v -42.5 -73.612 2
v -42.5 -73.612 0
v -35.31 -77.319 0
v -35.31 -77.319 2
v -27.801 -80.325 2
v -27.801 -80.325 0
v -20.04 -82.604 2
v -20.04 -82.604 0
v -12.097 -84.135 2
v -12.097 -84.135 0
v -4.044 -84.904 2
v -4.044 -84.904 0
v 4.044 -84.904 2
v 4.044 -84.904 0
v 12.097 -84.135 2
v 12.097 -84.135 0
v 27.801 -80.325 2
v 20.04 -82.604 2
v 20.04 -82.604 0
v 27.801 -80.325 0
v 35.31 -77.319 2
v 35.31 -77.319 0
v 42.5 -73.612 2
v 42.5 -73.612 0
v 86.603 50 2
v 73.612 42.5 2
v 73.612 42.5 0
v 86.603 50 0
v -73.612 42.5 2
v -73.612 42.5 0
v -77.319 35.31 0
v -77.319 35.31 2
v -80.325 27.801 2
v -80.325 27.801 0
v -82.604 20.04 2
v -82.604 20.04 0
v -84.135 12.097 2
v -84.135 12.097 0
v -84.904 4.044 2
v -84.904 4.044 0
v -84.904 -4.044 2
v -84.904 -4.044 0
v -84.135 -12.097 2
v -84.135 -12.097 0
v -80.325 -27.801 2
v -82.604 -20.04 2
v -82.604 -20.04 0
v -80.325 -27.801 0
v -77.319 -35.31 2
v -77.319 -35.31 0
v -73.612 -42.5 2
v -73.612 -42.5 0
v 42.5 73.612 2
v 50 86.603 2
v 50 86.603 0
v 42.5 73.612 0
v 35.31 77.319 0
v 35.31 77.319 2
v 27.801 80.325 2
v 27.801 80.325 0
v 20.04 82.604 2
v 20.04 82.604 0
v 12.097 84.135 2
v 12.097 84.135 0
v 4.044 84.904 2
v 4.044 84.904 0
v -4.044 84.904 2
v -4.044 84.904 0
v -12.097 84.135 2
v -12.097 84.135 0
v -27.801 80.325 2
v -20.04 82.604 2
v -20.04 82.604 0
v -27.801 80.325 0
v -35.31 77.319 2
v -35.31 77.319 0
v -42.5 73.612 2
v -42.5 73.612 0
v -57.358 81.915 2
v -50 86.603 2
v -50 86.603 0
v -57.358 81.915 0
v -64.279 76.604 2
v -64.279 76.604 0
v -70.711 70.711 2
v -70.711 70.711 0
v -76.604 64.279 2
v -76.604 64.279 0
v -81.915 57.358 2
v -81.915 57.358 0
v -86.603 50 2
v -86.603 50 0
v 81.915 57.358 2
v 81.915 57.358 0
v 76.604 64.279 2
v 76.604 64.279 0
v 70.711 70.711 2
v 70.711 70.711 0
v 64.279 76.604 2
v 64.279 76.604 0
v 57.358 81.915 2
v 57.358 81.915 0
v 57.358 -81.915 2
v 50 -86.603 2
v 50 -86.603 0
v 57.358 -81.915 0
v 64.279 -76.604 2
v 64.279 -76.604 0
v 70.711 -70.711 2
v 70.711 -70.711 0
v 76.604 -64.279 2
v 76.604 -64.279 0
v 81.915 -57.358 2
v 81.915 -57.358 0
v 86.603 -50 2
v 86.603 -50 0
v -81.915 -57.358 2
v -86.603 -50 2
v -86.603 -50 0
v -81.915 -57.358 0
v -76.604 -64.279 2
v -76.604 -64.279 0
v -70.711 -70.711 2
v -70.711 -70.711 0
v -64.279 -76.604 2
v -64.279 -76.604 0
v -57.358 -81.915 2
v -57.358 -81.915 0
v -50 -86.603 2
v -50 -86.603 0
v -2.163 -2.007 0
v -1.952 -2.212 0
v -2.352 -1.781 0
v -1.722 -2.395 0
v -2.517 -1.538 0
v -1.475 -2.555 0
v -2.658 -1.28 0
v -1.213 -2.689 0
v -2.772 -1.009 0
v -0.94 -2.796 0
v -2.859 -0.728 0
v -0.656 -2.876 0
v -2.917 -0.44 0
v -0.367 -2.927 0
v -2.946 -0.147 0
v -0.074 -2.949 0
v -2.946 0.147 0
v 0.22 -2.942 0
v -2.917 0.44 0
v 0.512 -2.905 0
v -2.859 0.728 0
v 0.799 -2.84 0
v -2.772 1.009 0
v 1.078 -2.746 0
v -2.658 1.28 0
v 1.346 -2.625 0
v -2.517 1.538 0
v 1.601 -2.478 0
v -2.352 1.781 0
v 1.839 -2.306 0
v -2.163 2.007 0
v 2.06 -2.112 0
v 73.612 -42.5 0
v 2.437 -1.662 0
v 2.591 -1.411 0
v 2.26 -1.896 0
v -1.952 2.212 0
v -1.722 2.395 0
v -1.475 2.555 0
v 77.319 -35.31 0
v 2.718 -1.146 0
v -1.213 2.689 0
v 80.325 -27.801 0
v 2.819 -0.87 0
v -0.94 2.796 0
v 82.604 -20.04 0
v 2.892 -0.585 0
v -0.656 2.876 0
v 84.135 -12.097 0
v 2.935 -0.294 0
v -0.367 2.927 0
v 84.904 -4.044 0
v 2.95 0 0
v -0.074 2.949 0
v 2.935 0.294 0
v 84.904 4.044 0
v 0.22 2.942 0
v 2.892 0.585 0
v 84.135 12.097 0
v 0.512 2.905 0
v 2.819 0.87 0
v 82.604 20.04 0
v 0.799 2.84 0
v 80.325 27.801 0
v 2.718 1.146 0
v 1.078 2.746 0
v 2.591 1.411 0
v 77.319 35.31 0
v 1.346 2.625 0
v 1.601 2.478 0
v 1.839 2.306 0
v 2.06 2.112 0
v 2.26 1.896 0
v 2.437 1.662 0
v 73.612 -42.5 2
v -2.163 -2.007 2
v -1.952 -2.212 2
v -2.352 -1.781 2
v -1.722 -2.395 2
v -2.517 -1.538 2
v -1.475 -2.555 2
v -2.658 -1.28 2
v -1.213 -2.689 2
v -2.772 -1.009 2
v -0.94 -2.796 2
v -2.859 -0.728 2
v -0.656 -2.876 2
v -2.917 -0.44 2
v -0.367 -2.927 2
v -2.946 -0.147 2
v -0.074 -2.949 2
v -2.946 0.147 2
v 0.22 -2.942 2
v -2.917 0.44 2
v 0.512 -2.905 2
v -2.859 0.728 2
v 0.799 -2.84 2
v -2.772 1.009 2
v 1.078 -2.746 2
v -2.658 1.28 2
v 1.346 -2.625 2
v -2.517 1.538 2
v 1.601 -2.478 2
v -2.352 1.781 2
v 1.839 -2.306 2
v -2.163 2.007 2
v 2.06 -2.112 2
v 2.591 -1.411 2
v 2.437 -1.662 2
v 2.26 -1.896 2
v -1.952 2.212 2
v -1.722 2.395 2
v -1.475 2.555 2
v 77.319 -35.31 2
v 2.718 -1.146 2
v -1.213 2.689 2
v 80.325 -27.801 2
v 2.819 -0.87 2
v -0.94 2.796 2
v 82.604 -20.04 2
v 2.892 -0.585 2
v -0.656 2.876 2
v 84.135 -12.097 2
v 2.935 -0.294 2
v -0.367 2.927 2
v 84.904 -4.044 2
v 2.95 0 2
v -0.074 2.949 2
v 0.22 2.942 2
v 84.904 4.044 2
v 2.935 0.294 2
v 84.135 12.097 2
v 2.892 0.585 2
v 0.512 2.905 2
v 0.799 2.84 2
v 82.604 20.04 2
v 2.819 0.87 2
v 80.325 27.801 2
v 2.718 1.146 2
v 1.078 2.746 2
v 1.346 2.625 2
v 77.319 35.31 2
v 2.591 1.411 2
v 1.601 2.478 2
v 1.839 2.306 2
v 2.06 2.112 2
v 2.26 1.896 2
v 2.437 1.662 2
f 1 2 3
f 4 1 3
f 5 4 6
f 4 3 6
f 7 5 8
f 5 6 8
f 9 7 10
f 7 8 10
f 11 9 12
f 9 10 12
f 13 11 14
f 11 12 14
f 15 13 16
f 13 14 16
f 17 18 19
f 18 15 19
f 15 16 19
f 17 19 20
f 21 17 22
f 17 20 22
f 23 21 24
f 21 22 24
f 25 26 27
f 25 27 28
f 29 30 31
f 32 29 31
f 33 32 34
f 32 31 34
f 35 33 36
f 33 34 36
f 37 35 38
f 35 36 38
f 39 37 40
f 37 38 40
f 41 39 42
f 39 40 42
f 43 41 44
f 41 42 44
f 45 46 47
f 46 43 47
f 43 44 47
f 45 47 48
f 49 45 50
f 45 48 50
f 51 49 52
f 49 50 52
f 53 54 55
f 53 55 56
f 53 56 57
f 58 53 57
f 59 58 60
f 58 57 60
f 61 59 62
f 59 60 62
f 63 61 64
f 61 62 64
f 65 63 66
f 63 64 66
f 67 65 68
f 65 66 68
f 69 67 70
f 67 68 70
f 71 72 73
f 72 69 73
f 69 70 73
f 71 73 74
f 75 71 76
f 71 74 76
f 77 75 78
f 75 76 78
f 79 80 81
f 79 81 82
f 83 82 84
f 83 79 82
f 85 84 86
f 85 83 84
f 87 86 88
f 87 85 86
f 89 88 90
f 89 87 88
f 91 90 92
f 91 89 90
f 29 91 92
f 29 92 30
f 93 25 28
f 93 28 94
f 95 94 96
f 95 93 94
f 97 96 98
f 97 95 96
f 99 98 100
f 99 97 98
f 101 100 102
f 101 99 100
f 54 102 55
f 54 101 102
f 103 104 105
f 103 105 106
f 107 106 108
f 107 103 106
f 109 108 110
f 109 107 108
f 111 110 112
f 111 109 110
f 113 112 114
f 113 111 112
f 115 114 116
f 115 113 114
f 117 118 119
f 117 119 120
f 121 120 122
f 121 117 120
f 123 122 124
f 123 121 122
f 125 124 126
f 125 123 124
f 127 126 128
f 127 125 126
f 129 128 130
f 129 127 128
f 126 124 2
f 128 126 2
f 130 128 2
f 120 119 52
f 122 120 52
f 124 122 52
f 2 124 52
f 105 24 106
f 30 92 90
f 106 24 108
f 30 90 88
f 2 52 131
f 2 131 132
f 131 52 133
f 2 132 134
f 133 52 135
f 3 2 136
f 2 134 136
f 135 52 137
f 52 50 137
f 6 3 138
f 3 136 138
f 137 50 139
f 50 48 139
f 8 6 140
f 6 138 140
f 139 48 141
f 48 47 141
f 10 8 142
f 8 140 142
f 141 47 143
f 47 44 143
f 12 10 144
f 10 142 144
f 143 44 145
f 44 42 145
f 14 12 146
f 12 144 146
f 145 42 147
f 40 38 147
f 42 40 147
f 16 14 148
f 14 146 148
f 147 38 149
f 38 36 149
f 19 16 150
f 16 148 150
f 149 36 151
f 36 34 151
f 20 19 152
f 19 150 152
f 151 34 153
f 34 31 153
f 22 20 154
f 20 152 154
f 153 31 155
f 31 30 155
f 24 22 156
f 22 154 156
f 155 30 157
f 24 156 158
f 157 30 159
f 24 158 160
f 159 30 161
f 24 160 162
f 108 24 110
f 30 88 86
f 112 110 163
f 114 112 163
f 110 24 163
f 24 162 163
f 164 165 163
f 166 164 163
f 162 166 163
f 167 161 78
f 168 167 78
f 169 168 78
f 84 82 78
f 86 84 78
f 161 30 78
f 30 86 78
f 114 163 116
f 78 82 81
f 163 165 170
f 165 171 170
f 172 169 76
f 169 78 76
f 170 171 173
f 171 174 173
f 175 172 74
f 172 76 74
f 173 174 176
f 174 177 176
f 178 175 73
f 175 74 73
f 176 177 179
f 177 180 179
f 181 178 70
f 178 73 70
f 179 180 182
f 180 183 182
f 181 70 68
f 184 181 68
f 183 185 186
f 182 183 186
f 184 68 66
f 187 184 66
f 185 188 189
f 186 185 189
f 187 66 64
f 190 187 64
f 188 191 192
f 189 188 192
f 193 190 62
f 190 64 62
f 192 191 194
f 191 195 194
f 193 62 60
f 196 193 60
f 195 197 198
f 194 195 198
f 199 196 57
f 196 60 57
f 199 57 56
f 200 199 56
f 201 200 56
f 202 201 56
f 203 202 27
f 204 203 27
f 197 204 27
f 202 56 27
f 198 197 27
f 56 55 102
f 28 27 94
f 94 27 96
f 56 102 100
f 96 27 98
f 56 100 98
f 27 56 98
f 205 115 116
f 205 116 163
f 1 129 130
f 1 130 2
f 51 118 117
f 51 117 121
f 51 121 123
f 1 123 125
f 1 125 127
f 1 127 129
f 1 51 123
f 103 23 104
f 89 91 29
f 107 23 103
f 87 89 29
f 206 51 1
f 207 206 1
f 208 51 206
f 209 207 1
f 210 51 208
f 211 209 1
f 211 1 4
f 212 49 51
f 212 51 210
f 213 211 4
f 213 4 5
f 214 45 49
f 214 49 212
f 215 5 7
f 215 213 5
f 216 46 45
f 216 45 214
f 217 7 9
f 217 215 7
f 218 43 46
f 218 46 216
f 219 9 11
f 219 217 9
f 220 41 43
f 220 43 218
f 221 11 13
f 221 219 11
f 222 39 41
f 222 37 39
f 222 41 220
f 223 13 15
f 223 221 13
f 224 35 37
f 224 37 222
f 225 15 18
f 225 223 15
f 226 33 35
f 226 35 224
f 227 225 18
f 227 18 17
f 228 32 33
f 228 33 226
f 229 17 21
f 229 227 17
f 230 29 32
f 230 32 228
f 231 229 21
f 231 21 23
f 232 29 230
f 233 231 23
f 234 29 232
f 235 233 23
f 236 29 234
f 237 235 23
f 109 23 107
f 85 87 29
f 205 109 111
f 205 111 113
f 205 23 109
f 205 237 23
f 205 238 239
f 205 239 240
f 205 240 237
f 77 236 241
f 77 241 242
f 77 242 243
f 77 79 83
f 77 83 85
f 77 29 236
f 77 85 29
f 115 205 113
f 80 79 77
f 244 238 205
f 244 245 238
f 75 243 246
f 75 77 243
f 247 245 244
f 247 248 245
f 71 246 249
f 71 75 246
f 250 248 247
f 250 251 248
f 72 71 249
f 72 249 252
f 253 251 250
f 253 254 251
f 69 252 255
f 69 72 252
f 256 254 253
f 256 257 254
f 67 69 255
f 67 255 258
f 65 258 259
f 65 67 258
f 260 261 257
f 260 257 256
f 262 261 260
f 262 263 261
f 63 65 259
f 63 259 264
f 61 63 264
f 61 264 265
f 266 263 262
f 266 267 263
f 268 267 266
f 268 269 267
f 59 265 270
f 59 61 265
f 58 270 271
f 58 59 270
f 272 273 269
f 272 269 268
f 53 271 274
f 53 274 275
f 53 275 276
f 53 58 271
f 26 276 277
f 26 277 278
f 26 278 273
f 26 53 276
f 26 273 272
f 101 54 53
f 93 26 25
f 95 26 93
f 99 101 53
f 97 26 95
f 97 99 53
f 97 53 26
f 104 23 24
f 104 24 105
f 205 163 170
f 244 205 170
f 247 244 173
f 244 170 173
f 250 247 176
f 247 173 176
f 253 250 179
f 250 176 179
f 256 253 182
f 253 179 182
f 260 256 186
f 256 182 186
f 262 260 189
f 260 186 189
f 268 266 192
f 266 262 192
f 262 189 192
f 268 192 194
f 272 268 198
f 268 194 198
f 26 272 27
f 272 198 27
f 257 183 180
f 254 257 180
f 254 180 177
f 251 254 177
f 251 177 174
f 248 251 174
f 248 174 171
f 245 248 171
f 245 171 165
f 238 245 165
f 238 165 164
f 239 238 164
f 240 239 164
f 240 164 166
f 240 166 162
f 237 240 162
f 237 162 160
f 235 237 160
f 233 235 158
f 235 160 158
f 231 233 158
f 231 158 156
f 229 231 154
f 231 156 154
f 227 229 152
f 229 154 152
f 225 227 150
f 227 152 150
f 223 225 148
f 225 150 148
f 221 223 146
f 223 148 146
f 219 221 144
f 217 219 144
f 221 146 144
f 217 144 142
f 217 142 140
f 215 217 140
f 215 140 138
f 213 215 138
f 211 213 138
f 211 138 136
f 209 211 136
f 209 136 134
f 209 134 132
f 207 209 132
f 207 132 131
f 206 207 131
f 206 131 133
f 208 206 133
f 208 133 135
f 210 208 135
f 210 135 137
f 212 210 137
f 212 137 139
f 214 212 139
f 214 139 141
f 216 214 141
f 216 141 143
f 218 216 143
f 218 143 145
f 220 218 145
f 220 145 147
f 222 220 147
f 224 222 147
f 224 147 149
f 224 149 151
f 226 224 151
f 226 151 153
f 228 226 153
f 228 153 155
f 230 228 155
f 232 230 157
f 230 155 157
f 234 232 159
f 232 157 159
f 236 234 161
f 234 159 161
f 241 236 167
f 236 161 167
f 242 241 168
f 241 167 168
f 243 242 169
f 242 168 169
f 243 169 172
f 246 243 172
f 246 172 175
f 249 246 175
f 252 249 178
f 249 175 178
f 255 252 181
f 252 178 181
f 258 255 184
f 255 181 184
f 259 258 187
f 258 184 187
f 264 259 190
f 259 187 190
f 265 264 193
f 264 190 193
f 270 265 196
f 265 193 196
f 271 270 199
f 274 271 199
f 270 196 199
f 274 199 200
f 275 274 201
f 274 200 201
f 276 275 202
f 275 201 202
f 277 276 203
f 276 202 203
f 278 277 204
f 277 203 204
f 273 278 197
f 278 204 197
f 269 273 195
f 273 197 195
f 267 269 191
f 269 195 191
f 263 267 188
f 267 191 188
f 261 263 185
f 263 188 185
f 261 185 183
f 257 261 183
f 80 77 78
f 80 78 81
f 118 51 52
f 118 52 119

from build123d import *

# Parameters (mm, degrees)
F0_R            = 85
F1_DEPTH        = 2
F3_DEPTH        = 2
F3_COPIES_COUNT = 4
F4_R            = 2.95
F5_DEPTH        = 25


# Not quite as in the source:
# - a pattern or mirror of a feature is missing from the dataset's text; its kind, count and spacing are read off the source's solid
# - a feature names something its author has since deleted; it is built from what else it names


with BuildPart() as f1:
    # F0 (on Top) → F1 (new body)
    with BuildSketch(Plane.XY):
        Circle(F0_R)
    extrude(amount=F1_DEPTH)

    # F2 (on face) → F3 (join)
    with BuildSketch(Plane.XY.offset(2)):
        with BuildLine():
            ThreePointArc((-42.5, -73.6121593217), (-60.1040764009, -60.1040764009), (-73.6121593217, -42.5))
            Line((-73.6121593217, -42.5), (-86.6025403784, -50))
            ThreePointArc((-86.6025403784, -50), (-70.7106781187, -70.7106781187), (-50, -86.6025403784))
            Line((-50, -86.6025403784), (-42.5, -73.6121593217))
        make_face()
    f3 = extrude(amount=-F3_DEPTH)

    # F3_copies: F3 ×4 about axis
    f3_copies_axis = Axis((0, 0, 0), (0, 0, 1))
    for i in range(1, F3_COPIES_COUNT):
        add(f3.rotate(f3_copies_axis, i * 360 / F3_COPIES_COUNT))

    # F4 (on face) → F5 (cut)
    with BuildSketch(Plane(origin=(0, 0, 0), x_dir=(1, 0, 0), z_dir=(0, 0, -1))):
        Circle(F4_R)
    extrude(amount=-F5_DEPTH, mode=Mode.SUBTRACT)


solid = f1.part
